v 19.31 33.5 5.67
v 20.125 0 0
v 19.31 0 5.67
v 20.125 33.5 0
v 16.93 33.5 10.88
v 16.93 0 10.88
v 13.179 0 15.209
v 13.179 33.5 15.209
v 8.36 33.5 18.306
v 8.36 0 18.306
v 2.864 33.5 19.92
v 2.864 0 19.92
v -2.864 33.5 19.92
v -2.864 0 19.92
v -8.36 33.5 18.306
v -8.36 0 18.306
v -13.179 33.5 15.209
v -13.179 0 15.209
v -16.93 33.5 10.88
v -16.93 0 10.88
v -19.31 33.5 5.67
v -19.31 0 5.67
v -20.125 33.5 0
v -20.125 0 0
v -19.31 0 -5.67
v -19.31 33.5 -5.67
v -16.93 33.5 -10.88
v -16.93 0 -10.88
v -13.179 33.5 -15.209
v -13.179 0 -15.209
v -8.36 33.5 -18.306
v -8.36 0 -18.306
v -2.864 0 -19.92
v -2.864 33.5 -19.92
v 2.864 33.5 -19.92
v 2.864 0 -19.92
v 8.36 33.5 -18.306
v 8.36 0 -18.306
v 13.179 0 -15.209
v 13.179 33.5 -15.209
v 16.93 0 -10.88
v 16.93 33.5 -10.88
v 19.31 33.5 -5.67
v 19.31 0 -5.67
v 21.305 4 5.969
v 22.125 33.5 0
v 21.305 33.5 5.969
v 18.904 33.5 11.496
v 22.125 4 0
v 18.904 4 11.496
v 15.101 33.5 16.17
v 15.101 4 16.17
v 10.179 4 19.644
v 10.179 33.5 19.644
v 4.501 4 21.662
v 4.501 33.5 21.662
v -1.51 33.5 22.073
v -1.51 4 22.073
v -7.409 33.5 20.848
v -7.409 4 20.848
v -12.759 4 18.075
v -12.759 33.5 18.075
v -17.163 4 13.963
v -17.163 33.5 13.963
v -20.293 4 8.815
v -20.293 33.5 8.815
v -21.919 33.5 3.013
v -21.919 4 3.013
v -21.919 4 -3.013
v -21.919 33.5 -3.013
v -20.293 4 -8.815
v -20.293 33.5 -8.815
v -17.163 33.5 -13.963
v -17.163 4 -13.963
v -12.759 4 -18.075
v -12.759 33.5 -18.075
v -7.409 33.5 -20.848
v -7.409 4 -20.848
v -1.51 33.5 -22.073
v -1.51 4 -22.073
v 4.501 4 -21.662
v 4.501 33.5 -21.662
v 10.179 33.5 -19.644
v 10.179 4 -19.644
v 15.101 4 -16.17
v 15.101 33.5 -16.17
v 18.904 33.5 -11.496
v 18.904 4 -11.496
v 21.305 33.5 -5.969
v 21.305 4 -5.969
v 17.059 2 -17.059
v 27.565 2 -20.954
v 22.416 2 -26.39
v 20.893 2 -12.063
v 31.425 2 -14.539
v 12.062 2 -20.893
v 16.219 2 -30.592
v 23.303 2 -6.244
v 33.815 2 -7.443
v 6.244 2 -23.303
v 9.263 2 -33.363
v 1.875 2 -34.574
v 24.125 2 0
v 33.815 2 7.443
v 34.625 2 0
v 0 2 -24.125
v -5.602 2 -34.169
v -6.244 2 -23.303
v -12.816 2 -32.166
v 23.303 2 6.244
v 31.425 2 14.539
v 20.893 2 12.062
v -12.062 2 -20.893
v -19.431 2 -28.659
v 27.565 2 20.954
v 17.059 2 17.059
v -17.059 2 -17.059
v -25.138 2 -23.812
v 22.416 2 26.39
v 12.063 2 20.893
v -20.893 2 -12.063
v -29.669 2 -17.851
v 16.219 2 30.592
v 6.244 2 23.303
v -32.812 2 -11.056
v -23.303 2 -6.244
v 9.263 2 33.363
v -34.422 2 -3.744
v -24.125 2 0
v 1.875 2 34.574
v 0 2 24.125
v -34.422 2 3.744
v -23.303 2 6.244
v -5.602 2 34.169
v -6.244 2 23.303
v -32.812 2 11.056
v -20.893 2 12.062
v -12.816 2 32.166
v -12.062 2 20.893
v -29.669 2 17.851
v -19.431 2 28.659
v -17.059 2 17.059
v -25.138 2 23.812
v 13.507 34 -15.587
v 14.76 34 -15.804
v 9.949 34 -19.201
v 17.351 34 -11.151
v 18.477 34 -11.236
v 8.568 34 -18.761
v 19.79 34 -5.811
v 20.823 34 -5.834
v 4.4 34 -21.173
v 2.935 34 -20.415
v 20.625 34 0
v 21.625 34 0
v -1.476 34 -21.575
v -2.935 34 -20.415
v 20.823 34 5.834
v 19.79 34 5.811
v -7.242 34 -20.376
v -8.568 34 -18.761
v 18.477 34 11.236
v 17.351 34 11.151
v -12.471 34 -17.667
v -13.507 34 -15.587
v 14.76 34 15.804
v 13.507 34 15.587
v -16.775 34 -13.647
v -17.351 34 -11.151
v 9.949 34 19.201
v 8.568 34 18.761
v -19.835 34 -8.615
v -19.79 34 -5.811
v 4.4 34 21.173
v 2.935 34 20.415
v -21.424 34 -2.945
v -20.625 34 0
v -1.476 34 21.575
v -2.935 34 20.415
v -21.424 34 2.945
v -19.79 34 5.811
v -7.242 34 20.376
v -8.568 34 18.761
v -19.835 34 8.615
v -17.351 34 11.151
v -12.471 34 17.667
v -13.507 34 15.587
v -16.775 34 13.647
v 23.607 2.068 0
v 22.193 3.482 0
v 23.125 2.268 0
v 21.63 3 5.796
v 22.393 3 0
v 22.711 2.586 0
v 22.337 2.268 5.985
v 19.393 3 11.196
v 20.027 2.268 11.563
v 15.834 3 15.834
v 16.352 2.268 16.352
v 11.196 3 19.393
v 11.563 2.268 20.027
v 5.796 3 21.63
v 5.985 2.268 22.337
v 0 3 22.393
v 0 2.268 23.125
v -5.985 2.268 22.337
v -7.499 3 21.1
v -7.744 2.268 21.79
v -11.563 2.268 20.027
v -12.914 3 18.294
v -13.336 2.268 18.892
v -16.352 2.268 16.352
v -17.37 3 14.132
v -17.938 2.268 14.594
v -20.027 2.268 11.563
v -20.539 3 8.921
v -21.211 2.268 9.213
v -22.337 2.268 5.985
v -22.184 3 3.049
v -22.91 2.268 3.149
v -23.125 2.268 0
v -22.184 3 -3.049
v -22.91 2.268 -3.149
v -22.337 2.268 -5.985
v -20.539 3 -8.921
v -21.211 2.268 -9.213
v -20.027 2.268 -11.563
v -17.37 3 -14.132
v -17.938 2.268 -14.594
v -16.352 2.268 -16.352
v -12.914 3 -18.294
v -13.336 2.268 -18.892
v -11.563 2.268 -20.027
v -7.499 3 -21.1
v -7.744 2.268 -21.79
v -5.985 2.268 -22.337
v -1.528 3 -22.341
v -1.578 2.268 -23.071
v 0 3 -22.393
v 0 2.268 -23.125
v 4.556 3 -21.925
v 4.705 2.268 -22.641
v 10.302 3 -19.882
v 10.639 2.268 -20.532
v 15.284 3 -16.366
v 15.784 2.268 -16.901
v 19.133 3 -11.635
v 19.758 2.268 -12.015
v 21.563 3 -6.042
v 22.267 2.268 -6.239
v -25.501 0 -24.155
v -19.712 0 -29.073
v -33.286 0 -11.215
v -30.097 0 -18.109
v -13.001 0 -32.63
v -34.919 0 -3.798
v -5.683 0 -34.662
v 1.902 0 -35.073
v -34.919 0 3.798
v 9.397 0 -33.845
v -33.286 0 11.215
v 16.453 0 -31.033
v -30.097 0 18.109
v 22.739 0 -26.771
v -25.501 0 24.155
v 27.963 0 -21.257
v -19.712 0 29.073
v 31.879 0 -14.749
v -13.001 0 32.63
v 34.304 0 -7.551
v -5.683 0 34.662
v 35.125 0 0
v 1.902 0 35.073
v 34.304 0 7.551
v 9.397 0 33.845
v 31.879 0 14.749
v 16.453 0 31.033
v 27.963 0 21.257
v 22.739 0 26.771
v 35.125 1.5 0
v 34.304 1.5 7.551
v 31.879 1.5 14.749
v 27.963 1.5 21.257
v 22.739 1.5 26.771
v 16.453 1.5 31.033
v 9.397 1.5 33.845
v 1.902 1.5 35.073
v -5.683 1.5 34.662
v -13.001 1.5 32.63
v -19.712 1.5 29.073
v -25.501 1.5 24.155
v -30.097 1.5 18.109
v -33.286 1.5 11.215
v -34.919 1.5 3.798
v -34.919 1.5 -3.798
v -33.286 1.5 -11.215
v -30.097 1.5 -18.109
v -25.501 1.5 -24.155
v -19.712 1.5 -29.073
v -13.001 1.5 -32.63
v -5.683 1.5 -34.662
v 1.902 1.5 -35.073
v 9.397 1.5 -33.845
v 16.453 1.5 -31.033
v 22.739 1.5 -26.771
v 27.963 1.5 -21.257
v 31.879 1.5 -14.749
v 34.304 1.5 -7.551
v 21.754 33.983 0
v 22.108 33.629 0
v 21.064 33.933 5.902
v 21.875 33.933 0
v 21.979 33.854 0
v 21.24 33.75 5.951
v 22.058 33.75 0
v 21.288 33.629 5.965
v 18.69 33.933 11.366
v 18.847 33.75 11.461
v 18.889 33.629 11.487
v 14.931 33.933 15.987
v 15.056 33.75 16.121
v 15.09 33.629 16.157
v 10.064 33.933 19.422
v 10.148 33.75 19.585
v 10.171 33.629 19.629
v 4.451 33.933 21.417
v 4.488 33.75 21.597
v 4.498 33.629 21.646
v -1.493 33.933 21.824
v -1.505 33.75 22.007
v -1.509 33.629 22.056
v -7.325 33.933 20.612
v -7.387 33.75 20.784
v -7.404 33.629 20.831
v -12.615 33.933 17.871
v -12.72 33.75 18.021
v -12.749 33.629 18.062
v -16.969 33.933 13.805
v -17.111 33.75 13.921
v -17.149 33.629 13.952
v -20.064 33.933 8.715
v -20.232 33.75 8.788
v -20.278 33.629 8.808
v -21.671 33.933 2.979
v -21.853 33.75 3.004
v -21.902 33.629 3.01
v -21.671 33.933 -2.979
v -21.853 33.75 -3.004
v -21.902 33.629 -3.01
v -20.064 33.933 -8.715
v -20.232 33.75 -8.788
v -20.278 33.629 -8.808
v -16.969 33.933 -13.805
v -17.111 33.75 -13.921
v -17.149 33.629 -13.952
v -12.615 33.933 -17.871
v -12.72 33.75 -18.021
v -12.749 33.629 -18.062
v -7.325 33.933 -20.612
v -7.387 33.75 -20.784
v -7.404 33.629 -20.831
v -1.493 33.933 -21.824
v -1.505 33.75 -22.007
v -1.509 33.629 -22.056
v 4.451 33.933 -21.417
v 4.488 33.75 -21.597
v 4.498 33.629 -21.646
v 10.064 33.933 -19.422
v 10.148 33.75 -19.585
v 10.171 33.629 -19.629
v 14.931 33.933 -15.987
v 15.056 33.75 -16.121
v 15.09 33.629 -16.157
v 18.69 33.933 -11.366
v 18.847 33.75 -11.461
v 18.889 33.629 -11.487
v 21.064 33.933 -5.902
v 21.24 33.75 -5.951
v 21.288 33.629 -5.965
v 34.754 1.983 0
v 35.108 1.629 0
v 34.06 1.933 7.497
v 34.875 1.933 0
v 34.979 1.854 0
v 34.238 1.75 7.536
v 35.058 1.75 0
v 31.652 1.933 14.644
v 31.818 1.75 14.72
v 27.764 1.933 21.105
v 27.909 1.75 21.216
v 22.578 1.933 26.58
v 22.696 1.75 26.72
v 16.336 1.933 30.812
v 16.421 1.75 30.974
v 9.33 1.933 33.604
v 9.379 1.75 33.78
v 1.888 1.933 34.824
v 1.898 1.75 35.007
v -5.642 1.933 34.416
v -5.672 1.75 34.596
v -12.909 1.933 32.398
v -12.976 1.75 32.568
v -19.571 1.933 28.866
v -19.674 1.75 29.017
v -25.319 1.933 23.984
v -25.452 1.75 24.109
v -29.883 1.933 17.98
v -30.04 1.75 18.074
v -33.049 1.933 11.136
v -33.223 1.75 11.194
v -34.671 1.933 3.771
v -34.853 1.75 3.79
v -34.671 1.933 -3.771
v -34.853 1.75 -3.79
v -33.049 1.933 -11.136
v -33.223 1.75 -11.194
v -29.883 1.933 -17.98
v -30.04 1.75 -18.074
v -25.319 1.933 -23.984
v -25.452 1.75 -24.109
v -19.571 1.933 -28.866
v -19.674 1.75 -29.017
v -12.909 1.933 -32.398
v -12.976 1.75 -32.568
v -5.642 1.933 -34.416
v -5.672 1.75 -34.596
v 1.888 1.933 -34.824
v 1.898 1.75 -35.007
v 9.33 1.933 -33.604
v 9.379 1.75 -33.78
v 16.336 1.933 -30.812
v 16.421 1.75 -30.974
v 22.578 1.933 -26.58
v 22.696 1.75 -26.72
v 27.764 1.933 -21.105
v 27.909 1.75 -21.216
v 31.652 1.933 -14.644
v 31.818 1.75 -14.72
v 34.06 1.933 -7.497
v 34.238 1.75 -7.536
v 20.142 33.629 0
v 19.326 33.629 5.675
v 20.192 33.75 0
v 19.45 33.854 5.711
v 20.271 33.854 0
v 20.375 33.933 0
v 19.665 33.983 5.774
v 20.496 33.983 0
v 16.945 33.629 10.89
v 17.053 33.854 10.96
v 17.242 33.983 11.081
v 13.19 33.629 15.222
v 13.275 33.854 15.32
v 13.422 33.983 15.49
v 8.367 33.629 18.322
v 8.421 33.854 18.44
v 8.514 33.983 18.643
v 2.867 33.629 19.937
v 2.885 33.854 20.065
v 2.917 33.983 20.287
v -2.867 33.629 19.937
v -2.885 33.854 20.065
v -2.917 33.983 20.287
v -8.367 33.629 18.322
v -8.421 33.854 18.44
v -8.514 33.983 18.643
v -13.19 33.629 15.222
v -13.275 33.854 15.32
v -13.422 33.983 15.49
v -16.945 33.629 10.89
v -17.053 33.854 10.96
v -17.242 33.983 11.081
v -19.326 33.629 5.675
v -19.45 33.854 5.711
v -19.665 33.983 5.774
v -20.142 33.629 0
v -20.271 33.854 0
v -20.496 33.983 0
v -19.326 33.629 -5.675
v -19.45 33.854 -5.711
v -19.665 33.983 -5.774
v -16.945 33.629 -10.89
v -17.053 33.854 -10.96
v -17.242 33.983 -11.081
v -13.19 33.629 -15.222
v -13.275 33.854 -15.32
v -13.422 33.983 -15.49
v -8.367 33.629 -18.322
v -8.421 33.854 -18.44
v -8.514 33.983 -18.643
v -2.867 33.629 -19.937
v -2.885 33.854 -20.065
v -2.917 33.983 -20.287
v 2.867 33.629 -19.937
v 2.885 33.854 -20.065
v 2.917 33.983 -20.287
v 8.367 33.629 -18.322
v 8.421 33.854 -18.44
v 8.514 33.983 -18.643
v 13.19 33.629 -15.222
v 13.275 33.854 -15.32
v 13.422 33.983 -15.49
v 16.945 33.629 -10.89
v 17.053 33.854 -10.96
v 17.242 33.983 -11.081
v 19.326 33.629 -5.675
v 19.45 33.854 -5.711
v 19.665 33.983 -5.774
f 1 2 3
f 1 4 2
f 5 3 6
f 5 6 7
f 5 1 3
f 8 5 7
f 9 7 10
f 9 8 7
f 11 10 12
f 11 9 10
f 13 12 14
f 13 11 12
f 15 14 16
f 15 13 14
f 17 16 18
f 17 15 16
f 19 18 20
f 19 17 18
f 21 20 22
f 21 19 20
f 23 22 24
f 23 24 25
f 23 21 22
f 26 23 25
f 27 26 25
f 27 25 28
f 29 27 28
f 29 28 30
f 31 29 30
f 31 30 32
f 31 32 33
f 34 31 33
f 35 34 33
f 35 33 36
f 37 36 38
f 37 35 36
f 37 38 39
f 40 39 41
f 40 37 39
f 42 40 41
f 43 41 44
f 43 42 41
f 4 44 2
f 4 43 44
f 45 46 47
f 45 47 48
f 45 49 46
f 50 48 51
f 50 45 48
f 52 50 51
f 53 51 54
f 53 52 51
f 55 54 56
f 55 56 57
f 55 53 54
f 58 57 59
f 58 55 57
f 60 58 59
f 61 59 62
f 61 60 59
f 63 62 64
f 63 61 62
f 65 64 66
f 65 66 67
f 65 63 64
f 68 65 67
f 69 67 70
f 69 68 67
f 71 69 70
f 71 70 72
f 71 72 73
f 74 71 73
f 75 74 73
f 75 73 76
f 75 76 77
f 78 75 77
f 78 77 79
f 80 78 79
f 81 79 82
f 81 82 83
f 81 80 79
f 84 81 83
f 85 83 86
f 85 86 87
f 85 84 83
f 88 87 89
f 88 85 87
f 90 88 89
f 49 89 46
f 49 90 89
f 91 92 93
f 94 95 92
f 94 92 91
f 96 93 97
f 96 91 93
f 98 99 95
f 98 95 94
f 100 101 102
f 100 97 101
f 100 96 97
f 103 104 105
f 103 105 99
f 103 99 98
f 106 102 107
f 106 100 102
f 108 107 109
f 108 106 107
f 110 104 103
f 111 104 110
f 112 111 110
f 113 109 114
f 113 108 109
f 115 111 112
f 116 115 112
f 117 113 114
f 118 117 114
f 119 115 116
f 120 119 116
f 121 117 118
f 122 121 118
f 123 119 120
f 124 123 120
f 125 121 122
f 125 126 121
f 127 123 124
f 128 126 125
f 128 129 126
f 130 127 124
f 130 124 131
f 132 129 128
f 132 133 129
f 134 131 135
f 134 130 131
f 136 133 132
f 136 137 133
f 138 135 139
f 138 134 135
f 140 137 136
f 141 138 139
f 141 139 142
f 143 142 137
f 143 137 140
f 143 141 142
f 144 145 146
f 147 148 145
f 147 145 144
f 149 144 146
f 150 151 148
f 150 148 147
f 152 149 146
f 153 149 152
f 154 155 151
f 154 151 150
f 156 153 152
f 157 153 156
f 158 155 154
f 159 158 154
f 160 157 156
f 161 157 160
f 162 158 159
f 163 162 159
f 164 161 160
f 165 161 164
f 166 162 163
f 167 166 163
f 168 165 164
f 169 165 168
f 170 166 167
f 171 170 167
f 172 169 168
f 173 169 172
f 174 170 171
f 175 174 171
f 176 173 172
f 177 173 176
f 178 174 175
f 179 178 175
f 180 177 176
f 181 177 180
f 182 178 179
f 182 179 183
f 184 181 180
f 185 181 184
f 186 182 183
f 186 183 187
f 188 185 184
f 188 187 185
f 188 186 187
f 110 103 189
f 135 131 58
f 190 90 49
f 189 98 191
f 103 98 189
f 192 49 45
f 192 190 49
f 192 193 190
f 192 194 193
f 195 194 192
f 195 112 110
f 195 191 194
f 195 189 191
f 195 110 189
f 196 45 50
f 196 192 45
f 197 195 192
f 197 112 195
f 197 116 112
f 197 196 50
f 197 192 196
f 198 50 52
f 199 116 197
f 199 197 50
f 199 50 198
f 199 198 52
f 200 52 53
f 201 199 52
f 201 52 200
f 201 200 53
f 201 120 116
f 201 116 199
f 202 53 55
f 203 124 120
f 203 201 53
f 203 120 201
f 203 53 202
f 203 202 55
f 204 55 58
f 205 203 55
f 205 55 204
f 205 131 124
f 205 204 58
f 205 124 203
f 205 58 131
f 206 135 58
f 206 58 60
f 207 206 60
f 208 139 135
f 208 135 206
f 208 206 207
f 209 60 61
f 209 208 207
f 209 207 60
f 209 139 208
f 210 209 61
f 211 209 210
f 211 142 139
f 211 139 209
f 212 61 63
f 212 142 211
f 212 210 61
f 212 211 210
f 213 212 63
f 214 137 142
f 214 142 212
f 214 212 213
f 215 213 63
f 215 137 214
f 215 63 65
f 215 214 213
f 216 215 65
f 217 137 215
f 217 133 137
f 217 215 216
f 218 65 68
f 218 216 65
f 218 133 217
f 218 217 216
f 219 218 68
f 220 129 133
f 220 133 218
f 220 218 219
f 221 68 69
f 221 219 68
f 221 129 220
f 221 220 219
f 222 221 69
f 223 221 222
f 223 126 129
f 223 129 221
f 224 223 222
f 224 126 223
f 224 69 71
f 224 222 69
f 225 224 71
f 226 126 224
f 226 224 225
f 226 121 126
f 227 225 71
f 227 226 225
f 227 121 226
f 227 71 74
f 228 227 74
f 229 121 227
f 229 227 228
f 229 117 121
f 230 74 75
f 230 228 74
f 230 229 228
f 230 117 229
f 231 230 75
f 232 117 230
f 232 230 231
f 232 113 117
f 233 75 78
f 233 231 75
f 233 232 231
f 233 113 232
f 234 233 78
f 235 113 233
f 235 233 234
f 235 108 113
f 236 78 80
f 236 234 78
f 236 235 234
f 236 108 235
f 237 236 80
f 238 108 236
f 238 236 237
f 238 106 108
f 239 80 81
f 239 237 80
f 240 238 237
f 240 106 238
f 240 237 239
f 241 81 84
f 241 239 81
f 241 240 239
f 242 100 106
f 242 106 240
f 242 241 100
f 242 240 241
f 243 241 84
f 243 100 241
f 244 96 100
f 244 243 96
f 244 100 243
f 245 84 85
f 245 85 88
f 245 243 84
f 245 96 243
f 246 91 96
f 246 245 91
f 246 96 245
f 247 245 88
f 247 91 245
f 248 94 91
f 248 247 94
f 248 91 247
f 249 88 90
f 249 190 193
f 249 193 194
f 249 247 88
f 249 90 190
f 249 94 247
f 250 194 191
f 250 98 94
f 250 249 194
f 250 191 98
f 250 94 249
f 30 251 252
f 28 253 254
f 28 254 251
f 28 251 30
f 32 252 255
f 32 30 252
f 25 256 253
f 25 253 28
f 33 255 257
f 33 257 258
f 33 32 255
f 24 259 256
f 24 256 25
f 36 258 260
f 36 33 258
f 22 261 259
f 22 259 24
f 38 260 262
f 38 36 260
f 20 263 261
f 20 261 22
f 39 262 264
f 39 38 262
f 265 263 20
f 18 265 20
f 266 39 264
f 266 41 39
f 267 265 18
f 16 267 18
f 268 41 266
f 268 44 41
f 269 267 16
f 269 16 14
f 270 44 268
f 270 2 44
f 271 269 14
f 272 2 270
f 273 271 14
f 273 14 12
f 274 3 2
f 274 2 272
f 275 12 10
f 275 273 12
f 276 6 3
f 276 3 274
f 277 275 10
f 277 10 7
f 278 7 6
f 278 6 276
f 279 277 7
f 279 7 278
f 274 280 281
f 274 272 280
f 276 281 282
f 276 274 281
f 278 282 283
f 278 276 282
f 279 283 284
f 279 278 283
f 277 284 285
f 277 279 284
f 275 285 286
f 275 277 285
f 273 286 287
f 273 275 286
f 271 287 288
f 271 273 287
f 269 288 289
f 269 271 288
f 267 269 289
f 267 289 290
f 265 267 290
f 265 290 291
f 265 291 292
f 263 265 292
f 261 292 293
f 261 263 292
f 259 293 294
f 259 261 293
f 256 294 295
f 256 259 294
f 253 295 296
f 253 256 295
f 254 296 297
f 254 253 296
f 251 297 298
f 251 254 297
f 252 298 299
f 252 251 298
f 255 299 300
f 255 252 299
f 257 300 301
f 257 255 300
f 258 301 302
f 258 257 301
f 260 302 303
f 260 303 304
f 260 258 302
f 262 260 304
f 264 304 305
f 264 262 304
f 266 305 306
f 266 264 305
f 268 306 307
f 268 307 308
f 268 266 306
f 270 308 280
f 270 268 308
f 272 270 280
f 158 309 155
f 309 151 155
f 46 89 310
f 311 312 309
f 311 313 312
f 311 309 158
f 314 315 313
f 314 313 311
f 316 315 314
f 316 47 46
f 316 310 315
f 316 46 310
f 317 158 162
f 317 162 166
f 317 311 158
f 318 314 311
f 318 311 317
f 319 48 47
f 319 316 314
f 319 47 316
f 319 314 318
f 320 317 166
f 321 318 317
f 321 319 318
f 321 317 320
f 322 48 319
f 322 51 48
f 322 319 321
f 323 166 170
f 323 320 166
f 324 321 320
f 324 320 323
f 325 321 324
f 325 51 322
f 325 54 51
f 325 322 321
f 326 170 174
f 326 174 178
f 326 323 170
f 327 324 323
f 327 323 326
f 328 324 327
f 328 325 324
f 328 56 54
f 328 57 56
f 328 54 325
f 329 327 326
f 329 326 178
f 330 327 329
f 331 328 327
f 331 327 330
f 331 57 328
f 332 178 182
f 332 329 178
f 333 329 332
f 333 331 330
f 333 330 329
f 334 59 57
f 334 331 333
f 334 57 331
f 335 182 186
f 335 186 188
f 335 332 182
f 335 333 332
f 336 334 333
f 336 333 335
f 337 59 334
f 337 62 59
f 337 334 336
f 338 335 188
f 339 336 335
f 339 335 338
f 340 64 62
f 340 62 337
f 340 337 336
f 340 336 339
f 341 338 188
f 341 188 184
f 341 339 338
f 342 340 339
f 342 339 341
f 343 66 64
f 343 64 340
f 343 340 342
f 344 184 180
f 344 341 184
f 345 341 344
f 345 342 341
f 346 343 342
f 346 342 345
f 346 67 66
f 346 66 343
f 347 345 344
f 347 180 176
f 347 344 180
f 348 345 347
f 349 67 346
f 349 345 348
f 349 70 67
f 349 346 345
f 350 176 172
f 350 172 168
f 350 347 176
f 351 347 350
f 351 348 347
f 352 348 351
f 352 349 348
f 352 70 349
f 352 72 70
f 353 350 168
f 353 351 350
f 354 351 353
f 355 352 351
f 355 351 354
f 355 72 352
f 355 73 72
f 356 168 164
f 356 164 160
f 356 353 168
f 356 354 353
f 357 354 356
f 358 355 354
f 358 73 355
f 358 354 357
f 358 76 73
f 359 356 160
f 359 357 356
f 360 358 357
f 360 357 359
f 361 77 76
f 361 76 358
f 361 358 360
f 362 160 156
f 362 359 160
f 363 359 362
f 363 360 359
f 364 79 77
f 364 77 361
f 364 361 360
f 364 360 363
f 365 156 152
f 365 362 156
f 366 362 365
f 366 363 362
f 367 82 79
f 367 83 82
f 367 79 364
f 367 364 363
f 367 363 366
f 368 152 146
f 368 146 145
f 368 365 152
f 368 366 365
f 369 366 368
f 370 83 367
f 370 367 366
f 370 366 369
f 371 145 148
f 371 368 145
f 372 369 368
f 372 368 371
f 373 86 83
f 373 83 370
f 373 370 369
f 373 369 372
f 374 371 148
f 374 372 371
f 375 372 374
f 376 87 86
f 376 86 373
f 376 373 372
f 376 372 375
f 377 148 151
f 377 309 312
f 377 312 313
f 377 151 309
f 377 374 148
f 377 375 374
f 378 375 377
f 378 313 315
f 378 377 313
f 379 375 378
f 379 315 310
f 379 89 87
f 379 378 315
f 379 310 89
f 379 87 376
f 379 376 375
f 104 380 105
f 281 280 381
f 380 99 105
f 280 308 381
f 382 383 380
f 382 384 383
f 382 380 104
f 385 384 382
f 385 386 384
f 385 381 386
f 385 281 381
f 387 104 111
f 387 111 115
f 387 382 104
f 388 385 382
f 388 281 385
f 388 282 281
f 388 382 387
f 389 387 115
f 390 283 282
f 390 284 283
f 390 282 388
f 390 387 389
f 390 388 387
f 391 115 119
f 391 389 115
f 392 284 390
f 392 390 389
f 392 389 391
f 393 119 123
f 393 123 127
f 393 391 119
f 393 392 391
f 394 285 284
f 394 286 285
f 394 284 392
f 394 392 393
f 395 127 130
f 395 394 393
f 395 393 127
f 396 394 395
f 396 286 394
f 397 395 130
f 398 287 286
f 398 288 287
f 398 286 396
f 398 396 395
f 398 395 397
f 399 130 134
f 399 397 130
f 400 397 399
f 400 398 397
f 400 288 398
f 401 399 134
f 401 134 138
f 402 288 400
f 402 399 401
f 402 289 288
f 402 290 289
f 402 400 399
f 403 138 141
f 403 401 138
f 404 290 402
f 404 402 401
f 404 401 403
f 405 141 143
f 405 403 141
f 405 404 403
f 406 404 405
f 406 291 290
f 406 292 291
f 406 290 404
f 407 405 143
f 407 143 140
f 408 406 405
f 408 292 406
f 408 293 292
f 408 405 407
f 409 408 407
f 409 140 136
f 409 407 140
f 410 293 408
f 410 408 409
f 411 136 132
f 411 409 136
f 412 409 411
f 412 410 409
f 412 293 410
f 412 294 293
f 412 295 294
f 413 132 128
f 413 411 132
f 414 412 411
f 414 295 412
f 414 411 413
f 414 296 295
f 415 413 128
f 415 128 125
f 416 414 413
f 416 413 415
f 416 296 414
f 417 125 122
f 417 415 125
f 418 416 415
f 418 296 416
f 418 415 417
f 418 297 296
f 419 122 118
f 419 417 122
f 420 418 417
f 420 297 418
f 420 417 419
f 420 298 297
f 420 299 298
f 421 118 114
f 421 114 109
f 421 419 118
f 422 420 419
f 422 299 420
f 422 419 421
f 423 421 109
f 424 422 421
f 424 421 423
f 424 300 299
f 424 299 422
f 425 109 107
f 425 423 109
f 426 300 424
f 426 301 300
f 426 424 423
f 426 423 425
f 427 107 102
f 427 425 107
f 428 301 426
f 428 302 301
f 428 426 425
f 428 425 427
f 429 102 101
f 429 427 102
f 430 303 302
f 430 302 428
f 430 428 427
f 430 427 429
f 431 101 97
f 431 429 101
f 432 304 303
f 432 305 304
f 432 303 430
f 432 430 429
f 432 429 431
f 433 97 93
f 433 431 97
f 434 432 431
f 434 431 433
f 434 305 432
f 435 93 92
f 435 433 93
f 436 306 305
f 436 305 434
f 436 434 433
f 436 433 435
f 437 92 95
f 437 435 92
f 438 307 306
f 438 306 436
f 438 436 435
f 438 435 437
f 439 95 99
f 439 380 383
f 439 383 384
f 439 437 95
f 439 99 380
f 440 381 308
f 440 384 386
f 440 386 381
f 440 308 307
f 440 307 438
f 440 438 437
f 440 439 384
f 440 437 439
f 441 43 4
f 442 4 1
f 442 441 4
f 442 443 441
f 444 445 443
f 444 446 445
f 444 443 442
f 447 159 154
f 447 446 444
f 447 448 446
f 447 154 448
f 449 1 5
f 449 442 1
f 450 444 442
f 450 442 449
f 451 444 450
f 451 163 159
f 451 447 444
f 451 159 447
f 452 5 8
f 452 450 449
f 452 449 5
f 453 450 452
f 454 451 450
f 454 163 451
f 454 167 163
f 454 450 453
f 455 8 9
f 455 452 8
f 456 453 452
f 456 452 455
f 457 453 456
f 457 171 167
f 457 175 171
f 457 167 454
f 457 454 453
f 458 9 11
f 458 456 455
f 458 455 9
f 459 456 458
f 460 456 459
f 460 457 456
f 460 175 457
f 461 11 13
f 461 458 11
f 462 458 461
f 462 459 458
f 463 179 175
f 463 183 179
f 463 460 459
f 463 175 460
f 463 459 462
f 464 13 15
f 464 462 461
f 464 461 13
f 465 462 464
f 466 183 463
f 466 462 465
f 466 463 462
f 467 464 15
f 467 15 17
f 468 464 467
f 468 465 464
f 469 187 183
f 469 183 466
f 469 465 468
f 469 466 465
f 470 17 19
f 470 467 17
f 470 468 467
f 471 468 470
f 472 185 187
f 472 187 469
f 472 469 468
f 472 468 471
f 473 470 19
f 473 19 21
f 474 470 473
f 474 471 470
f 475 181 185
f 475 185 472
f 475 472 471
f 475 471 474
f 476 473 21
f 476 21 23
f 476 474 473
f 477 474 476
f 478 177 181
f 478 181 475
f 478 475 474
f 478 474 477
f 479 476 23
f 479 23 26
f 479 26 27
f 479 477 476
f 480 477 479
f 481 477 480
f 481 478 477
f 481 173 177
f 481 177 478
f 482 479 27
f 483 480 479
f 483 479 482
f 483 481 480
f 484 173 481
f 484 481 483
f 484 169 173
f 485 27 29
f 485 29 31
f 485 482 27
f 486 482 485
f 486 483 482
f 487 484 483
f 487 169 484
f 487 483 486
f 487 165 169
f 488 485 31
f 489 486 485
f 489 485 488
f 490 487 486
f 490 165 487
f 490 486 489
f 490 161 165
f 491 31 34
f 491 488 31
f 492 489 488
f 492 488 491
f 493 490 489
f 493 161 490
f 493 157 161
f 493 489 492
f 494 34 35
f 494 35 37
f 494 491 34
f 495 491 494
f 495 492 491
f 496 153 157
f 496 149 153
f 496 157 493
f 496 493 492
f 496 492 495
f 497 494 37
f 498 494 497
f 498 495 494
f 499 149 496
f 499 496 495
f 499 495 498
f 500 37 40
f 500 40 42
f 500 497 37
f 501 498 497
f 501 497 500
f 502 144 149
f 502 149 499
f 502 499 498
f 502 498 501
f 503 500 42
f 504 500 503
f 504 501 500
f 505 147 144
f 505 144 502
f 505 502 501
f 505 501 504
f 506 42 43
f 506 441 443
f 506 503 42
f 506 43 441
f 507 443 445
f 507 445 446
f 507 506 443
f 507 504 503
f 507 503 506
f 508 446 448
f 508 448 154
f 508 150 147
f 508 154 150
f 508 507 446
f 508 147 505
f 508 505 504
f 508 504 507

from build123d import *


with BuildPart() as part:
    # Sketch1 → Revolve1 (revolve)
    with BuildSketch(Plane.XY):
        with BuildLine():
            Line((22.125, 33.5), (22.125, 4))
            ThreePointArc((22.125, 4), (22.710786438, 2.585786438), (24.125, 2))
            Line((24.125, 2), (34.625, 2))
            ThreePointArc((34.625, 2), (34.978553391, 1.853553391), (35.125, 1.5))
            Line((35.125, 1.5), (35.125, 0))
            Line((35.125, 0), (20.125, 0))
            Line((20.125, 0), (20.125, 33.5))
            ThreePointArc((20.125, 33.5), (20.271446609, 33.853553391), (20.625, 34))
            Line((20.625, 34), (21.625, 34))
            ThreePointArc((21.625, 34), (21.978553391, 33.853553391), (22.125, 33.5))
        make_face()
    revolve(axis=Axis((0, 40.764727394, 0), (0, -1, 0)))


solid = part.part
